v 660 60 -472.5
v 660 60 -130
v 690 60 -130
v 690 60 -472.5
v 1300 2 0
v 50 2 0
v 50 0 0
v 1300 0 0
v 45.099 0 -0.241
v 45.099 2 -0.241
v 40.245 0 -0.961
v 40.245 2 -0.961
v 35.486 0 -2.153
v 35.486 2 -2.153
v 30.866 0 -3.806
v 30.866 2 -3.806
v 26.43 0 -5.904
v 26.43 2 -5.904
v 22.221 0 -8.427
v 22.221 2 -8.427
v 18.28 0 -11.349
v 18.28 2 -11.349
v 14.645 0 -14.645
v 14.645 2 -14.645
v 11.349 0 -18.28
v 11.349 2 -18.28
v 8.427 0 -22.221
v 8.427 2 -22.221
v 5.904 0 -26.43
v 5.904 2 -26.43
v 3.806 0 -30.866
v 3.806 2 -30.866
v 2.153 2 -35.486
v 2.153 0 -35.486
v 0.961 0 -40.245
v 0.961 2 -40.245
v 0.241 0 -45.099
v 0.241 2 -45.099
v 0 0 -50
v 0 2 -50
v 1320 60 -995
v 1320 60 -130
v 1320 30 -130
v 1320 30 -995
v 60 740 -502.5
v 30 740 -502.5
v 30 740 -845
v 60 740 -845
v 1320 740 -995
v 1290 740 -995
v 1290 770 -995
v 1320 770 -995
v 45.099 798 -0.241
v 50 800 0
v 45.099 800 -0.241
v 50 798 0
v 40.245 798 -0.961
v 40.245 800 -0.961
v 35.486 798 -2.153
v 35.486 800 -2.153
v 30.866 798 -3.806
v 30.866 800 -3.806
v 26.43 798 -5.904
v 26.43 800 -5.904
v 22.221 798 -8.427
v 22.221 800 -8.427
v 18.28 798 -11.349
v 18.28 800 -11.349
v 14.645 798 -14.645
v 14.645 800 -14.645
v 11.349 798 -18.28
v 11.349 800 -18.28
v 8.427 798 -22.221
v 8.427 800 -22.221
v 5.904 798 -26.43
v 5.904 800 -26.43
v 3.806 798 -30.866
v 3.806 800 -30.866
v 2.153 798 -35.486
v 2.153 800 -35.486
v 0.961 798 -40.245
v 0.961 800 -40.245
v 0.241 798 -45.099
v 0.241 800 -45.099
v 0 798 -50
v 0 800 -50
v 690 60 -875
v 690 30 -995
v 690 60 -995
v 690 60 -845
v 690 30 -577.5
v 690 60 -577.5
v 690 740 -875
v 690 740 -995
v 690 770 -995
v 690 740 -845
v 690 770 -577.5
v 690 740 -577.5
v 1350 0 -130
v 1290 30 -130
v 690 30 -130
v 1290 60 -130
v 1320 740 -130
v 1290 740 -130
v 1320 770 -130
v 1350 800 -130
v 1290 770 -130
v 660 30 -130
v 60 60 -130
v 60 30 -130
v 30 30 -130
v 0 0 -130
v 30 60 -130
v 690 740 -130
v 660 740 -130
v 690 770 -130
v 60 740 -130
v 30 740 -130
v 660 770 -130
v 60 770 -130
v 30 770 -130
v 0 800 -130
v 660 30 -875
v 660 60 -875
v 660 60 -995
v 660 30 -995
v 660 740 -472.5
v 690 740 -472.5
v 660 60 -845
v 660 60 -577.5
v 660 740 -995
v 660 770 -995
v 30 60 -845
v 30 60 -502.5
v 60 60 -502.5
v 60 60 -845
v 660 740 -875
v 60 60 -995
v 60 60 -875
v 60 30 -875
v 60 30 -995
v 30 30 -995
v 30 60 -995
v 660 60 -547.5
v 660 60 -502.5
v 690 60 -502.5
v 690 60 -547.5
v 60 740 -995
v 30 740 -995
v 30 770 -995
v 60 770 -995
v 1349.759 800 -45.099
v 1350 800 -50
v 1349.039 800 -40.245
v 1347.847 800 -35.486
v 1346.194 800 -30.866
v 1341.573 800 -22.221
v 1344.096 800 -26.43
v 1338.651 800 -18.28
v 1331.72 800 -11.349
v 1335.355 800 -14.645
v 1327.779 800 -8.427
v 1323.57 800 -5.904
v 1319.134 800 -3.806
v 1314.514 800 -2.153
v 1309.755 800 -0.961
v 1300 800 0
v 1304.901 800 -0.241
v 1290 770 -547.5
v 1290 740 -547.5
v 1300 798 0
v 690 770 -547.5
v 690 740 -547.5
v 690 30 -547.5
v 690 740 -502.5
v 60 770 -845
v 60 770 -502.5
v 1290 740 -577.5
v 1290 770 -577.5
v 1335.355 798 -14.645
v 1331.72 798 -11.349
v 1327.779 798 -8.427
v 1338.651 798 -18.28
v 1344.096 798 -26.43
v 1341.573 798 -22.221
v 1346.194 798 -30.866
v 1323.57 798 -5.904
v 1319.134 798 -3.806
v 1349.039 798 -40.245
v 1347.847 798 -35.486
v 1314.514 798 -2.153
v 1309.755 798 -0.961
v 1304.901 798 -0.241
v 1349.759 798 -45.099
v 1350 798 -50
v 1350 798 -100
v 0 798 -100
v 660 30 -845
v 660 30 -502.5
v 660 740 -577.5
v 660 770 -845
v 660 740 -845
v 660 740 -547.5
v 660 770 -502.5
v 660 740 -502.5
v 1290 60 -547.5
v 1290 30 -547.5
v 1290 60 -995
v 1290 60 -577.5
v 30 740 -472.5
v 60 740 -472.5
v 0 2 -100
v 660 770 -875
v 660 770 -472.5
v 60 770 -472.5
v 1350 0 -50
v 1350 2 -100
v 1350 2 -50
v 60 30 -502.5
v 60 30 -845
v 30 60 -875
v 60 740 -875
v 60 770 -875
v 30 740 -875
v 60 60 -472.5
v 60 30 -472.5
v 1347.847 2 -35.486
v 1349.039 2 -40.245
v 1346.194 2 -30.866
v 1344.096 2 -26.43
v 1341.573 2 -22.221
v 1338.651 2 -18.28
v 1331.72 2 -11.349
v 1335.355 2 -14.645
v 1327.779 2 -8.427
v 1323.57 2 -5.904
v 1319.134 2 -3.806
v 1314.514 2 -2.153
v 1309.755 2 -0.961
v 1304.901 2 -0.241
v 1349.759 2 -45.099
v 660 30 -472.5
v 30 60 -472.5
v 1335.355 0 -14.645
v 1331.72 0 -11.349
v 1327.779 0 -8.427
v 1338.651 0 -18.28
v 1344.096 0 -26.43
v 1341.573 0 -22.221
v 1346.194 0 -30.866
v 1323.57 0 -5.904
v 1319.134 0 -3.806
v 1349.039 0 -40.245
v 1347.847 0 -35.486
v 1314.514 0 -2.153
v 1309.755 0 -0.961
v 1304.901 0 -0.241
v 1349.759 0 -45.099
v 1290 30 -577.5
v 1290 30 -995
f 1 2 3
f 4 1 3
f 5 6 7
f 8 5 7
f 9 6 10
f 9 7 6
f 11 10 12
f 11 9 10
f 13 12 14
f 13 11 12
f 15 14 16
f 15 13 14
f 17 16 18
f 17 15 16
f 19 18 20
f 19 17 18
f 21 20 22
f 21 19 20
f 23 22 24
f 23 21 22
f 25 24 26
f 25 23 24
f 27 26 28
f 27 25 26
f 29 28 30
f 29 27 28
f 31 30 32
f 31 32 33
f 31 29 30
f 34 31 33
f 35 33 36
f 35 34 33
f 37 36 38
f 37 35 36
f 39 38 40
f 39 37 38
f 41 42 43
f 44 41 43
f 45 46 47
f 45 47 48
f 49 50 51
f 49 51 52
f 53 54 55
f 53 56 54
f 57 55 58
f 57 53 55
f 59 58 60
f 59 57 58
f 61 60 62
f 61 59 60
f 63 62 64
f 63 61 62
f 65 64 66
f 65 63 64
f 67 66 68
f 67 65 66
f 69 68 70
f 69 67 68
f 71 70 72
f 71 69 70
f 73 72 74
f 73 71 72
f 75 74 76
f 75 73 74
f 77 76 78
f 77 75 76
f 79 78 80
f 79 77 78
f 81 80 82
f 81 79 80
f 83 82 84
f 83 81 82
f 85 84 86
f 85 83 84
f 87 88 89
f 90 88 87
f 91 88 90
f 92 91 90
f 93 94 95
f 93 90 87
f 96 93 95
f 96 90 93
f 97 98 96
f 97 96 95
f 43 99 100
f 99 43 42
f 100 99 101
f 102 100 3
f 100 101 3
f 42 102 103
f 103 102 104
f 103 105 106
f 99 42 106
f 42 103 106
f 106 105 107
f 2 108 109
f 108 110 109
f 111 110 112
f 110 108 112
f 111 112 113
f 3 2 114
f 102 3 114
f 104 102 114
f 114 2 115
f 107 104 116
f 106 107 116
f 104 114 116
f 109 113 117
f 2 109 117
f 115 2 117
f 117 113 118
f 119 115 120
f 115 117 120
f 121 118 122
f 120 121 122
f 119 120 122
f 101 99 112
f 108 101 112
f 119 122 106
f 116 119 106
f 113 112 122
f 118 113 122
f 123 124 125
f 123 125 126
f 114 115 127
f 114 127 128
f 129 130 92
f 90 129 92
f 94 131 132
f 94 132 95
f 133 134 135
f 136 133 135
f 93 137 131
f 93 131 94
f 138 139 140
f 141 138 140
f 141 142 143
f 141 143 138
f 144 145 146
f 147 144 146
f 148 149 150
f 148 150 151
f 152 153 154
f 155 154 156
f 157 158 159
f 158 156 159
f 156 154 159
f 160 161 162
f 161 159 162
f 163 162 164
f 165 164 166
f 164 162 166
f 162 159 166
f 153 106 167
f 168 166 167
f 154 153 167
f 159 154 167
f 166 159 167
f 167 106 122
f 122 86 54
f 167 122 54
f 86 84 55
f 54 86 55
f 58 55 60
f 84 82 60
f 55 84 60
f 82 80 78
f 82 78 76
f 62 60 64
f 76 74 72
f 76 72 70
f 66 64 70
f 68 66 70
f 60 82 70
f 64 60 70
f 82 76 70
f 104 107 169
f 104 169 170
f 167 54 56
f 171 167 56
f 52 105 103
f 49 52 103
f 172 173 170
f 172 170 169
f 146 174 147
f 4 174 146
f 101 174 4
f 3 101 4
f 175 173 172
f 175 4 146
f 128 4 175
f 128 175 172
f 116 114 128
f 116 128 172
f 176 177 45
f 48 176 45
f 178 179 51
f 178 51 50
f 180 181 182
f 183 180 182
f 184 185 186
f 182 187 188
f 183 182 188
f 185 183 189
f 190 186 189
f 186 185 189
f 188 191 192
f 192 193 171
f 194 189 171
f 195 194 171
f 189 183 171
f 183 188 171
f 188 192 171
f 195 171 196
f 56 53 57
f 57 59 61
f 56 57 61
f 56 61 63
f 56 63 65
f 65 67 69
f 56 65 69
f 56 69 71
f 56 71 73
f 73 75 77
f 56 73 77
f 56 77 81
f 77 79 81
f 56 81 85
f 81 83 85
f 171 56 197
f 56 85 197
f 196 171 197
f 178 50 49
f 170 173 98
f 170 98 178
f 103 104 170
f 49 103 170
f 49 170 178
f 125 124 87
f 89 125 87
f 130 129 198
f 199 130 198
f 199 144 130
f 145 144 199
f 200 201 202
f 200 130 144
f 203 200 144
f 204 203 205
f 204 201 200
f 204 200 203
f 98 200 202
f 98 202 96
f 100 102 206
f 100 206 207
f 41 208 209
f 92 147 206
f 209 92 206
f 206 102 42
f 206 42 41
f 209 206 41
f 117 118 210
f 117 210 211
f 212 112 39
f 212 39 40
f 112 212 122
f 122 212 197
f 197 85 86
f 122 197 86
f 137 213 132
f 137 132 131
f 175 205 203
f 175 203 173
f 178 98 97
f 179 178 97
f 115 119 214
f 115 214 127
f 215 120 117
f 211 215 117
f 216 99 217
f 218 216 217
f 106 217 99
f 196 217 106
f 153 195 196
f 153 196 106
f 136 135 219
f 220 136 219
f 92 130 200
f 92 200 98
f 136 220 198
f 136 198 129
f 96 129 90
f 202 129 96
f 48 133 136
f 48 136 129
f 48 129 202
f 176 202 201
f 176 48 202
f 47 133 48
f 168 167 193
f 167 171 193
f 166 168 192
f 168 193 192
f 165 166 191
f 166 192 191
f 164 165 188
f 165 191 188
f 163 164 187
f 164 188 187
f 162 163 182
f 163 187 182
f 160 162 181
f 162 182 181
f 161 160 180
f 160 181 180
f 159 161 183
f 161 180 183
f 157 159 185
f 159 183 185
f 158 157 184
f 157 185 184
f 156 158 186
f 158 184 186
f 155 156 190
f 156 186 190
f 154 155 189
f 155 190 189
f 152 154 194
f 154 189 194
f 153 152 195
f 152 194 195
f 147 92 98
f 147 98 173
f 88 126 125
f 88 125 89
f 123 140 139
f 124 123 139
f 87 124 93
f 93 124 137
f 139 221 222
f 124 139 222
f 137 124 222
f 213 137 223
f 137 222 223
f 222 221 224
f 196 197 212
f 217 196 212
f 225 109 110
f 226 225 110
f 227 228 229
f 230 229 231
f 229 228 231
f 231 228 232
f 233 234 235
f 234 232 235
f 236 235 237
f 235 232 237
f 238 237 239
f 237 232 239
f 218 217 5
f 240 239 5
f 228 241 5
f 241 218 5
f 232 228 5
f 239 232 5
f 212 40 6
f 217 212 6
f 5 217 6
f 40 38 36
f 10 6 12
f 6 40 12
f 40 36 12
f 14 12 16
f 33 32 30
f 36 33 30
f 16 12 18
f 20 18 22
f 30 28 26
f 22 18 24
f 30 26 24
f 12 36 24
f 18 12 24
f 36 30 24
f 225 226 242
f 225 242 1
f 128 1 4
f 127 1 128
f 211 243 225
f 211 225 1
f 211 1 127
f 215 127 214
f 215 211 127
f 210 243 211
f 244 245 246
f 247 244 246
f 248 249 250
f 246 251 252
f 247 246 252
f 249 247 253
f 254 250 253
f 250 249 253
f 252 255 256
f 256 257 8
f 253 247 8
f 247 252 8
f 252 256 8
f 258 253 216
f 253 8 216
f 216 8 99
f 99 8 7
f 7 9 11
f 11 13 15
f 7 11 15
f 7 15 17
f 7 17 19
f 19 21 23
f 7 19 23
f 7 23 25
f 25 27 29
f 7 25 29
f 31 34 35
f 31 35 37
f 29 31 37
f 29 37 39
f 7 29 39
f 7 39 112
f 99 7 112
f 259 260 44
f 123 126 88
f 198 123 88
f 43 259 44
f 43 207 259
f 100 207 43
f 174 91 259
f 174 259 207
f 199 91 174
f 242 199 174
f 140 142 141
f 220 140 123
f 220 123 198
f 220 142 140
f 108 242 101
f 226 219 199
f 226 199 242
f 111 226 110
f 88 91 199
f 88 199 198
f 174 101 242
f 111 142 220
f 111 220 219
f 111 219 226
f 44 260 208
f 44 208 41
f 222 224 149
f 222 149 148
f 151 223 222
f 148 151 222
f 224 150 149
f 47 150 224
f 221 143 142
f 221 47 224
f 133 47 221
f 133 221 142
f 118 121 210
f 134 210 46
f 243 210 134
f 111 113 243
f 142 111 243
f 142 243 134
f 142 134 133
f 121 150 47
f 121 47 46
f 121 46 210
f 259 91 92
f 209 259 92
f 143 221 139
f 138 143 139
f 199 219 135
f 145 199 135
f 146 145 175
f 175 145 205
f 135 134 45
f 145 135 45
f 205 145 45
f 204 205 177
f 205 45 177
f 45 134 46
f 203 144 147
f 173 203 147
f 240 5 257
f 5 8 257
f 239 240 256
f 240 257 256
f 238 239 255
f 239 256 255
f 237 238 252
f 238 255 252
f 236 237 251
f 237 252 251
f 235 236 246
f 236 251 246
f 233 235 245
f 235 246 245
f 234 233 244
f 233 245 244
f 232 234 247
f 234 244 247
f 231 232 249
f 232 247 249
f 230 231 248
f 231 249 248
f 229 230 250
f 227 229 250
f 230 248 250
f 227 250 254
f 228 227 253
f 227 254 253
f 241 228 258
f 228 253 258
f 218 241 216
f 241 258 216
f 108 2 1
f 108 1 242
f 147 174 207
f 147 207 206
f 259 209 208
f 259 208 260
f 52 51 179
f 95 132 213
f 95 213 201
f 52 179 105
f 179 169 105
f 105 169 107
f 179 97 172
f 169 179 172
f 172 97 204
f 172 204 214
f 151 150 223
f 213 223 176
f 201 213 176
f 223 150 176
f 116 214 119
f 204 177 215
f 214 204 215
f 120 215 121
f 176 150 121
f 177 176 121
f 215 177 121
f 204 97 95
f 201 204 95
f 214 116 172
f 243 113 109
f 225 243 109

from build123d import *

# Parameters (mm, degrees)
F1_DEPTH      = 1350
F2_R          = 50
F3_W          = 30
F3_H          = 30
F4_DEPTH      = 865
F5_W          = 740
F5_H          = 30
F6_DEPTH      = 630
F6_DEPTH_BACK = 30
F7_W          = 30
F7_H          = 30
F8_DEPTH      = 600
F9_W          = 30
F9_H          = 30
F10_DEPTH     = 680


with BuildPart() as f1:
    # F0 (on Right) → F1 (new body)
    with BuildSketch(Plane.YZ):
        Polygon((2, 0), (0, 0), (0, -130), (800, -130), (800, 0), (798, 0), (798, -100), (2, -100), align=None)
    extrude(amount=F1_DEPTH)

    # F2
    f2_edges = [f1.edges().sort_by_distance(p)[0] for p in [
        (1350, 1, 0),
        (1350, 799, 0),
        (0, 799, 0),
        (0, 1, 0),
    ]]
    fillet(f2_edges, radius=F2_R)

    # F3 (on face) → F4 (join)
    with BuildSketch(Plane(origin=(0, 0, -130), x_dir=(1, 0, 0), z_dir=(0, 0, -1))):
        with Locations((45, -45)):
            Rectangle(F3_W, F3_H)
        with Locations((1305, -45)):
            Rectangle(F3_W, F3_H)
        with Locations((1305, -755)):
            Rectangle(F3_W, F3_H)
        with Locations((45, -755)):
            Rectangle(F3_W, F3_H)
        with Locations((675, -45)):
            Rectangle(F3_W, F3_H)
        with Locations((675, -755)):
            Rectangle(F3_W, F3_H)
    extrude(amount=F4_DEPTH)

    # F5 (on face) → F6 (join, two sides)
    with BuildSketch(Plane.YZ.offset(60)) as f6_sk:
        with Locations((400, -860)):
            Rectangle(F5_W, F5_H)
        with Locations((400, -487.5)):
            Rectangle(F5_W, F5_H)
    extrude(amount=F6_DEPTH)
    extrude(f6_sk.sketch, amount=-F6_DEPTH_BACK)

    # F7 (on face) → F8 (join, through all)
    with BuildSketch(Plane.YZ.offset(690)):
        with Locations((45, -562.5)):
            Rectangle(F7_W, F7_H)
        with Locations((755, -562.5)):
            Rectangle(F7_W, F7_H)
    extrude(amount=F8_DEPTH)

    # F9 (on face) → F10 (join, through all)
    with BuildSketch(Plane.XZ.offset(-740)):
        with Locations((675, -562.5)):
            Rectangle(F9_W, F9_H)
    extrude(amount=F10_DEPTH)


solid = f1.part
